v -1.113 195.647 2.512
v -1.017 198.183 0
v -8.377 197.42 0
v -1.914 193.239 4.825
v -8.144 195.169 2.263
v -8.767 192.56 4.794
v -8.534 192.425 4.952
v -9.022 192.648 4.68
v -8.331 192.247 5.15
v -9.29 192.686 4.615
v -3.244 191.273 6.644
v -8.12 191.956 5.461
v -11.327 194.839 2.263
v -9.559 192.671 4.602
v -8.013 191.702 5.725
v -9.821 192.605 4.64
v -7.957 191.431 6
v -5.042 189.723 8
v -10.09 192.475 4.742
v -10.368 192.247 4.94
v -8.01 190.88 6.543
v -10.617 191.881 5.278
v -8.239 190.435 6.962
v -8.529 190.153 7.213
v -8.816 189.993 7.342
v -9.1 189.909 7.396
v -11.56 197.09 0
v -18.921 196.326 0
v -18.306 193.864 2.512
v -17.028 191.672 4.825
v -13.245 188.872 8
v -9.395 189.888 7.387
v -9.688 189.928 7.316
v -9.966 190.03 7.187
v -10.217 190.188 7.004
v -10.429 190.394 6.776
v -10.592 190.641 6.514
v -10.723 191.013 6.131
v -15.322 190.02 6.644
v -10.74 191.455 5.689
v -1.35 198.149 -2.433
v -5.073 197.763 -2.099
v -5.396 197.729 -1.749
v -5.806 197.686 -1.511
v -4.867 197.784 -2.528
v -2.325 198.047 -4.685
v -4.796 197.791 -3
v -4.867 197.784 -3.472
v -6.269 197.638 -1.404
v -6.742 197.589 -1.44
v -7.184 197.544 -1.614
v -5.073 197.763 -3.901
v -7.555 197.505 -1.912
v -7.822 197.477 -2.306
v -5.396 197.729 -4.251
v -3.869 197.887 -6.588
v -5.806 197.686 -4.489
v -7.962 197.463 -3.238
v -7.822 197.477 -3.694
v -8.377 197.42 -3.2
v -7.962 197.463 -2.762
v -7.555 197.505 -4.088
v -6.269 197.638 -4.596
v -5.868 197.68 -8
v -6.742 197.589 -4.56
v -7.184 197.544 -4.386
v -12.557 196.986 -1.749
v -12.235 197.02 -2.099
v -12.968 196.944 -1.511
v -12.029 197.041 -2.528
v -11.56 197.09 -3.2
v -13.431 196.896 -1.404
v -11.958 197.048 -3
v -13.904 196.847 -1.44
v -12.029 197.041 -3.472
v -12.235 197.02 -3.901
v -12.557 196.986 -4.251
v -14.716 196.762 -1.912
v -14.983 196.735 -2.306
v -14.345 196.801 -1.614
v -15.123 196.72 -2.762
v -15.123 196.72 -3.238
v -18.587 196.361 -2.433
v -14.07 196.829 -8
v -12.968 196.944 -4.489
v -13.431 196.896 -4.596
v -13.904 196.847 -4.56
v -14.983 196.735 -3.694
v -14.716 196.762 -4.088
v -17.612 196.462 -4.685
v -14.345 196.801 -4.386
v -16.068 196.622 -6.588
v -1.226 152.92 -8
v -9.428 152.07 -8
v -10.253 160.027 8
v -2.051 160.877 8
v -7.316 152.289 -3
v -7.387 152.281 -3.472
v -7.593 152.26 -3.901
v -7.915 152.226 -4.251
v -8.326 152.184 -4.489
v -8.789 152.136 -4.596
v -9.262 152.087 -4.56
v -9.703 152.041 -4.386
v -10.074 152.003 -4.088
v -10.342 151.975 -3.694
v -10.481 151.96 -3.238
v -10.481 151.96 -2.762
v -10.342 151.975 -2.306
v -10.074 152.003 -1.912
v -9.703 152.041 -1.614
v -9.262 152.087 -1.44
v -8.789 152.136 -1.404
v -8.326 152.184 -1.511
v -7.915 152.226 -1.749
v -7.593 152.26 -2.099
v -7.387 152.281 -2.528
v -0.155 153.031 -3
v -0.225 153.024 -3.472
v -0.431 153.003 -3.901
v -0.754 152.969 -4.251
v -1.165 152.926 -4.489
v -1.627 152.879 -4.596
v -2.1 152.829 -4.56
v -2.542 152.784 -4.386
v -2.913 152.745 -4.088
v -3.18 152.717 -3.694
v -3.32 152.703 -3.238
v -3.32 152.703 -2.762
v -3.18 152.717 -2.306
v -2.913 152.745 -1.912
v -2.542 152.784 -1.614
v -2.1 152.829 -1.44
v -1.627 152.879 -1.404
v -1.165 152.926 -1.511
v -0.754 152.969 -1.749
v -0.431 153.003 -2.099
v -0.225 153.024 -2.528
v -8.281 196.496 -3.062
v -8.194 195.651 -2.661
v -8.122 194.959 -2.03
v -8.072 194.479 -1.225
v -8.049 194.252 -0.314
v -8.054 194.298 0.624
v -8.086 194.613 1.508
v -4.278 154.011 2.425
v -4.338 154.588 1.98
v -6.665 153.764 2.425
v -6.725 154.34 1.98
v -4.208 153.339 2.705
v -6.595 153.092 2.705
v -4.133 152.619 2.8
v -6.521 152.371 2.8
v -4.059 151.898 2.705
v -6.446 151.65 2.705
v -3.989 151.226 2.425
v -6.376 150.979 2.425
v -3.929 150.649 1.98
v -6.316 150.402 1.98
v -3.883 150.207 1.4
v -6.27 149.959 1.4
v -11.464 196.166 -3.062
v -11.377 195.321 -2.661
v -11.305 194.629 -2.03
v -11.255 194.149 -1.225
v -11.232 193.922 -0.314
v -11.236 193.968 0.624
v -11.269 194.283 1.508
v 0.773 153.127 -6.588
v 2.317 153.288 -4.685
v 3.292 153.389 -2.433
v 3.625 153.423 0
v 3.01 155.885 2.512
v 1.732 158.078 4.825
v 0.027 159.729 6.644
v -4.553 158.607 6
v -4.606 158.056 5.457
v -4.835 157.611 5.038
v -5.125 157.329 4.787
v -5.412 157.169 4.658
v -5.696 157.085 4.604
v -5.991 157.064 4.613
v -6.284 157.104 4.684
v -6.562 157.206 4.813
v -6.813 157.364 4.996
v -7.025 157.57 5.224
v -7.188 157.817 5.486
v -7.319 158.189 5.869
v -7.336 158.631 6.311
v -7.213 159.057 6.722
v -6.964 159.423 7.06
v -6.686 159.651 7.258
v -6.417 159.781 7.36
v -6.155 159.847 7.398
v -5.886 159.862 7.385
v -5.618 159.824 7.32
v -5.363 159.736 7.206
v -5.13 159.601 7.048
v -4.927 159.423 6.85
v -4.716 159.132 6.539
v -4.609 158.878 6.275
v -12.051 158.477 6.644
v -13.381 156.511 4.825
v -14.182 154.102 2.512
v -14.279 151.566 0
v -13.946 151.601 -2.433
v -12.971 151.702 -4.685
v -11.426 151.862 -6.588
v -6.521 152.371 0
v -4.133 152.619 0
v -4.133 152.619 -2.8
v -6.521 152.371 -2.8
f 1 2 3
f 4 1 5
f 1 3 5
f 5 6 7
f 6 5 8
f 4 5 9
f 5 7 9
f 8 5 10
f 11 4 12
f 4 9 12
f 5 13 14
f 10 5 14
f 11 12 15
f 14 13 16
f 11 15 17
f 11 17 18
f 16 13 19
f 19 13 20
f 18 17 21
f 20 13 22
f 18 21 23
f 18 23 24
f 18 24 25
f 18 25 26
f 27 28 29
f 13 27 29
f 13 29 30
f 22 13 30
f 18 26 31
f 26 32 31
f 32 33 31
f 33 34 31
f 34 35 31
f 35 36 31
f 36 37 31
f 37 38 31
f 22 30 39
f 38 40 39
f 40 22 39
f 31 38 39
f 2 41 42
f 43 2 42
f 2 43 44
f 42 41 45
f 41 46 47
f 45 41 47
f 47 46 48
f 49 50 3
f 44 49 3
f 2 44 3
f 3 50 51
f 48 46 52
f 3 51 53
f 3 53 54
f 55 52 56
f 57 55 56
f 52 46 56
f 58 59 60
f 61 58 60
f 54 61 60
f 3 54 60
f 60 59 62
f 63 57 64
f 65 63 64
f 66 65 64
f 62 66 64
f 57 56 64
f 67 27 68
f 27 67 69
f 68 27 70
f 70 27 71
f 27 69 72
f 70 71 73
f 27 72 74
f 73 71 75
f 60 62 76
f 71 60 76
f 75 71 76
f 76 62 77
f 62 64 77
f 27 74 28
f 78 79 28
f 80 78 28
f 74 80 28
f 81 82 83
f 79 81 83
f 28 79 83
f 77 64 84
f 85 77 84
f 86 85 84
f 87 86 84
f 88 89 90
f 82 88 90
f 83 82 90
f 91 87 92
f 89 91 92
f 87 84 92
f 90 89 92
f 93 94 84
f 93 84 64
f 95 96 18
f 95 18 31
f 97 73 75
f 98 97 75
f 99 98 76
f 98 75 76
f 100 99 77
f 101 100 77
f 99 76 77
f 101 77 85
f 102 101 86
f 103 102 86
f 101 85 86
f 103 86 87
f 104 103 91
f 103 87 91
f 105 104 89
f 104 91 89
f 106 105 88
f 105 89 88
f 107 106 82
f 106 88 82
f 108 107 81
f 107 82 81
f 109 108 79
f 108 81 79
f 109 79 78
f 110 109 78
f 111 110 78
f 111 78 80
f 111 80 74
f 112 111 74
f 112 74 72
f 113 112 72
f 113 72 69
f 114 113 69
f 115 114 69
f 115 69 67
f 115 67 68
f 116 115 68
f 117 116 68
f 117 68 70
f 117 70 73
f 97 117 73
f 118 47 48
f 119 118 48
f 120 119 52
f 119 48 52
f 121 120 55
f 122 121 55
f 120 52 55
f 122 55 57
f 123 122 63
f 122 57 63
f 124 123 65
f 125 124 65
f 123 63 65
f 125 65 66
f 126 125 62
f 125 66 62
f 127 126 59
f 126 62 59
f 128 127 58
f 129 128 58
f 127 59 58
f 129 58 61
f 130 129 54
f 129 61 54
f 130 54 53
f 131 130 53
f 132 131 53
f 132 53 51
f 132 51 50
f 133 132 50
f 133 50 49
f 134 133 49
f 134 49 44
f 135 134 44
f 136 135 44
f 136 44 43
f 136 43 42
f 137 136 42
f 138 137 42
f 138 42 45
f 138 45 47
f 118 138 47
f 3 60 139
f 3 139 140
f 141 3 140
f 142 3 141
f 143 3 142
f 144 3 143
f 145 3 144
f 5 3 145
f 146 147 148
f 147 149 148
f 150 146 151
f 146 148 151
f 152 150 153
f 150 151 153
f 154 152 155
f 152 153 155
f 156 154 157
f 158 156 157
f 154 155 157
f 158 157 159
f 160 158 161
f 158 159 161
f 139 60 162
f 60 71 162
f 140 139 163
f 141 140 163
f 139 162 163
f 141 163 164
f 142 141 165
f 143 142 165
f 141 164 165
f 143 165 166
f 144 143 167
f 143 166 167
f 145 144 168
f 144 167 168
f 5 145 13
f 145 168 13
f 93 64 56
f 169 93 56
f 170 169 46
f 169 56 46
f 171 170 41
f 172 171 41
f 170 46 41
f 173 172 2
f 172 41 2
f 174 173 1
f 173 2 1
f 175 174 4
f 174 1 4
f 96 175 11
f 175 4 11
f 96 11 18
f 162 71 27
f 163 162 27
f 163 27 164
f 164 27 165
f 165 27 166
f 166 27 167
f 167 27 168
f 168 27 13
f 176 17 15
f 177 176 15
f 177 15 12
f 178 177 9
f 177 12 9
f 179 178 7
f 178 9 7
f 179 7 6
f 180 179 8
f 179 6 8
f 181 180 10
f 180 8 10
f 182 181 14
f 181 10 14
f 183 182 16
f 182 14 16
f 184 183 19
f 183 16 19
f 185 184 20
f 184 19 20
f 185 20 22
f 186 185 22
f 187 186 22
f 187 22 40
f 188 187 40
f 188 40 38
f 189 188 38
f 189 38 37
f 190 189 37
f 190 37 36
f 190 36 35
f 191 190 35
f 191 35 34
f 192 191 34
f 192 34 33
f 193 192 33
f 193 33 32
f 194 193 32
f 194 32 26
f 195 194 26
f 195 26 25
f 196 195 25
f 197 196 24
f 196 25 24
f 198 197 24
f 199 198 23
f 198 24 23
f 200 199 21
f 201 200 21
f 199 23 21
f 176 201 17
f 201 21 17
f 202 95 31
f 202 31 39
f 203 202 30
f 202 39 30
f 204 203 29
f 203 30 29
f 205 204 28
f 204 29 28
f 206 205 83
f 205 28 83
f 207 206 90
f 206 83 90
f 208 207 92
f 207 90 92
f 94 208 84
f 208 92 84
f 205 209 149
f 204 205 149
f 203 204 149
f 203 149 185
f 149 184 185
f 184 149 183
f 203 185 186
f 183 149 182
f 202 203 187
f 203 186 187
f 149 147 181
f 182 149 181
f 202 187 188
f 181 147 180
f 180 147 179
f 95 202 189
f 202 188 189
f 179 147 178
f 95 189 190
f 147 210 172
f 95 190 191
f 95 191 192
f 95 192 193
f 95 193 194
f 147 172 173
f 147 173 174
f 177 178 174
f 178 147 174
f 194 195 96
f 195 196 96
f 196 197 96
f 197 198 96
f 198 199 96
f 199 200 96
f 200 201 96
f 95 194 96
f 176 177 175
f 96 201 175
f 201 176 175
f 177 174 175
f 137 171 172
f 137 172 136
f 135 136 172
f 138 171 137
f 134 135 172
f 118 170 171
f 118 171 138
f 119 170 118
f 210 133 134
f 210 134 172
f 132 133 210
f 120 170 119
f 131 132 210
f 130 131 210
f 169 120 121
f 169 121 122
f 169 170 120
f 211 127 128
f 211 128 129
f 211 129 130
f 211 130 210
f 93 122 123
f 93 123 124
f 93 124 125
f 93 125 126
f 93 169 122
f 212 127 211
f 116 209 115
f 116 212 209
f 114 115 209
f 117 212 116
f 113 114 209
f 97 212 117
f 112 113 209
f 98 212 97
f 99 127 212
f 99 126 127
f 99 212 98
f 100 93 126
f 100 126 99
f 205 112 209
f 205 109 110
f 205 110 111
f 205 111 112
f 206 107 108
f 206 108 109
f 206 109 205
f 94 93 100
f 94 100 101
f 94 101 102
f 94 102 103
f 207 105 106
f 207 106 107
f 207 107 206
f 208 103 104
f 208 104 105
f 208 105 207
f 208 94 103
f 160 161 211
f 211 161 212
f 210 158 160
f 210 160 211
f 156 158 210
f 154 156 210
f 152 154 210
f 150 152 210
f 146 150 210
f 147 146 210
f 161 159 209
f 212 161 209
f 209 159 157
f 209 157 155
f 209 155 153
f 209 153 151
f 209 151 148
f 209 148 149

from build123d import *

# Parameters (mm, degrees)
SKETCH3_R               = 9
BOSS_EXTRUDE1_DEPTH     = 45
CUT_EXTRUDE1_DEPTH      = 14.617013191
CUT_EXTRUDE1_DEPTH_BACK = 14.617013191
BOSS_EXTRUDE2_DEPTH     = 1.2
CUT_EXTRUDE2_DEPTH      = 1.6
SKETCH8_R               = 1.6
SKETCH8_R_2             = 1.4
CUT_EXTRUDE3_DEPTH      = 2.846805277
CUT_EXTRUDE3_DEPTH_BACK = 49.445593418
CUT_EXTRUDE4_DEPTH      = 47.846805277


with BuildPart() as part:
    # Sketch3 → Boss-Extrude1 (new body)
    with BuildSketch(Plane(origin=(-20.344467381, 196.178792599, 0), x_dir=(-0.994665758, -0.103150523, 0), z_dir=(0.103150523, -0.994665758, 0))):
        with Locations((-10.431405186, 0)):
            Circle(SKETCH3_R)
    extrude(amount=BOSS_EXTRUDE1_DEPTH)

    # Sketch4 → Cut-Extrude1 (cut, two sides)
    with BuildSketch(Plane(origin=(10.375761543, 1.076004901, 0), x_dir=(0.103150523, -0.994665758, 0), z_dir=(-0.994665758, -0.103150523, 0))) as cut_extrude1_sk:
        Polygon((-197.230869842, 0), (-188.230869842, 9), (-197.230869842, 9), align=None)
        Polygon((-161.230869842, 9), (-152.230869842, 9), (-152.230869842, 0), align=None)
    extrude(amount=CUT_EXTRUDE1_DEPTH, mode=Mode.SUBTRACT)
    extrude(cut_extrude1_sk.sketch, amount=-CUT_EXTRUDE1_DEPTH_BACK, mode=Mode.SUBTRACT)

    # Sketch5 → Boss-Extrude2 (add, symmetric)
    with BuildSketch(Plane(origin=(10.375761543, 1.076004901, 0), x_dir=(0.103150523, -0.994665758, 0), z_dir=(-0.994665758, -0.103150523, 0))):
        with BuildLine():
            Line((-152.230869842, 0), (-154.210768829, 1.979898987))
            ThreePointArc((-154.210768829, 1.979898987), (-151.865396504, 2.776045612), (-149.805998711, 1.4))
            Line((-149.805998711, 1.4), (-152.230869842, -2.8))
            Line((-152.230869842, -2.8), (-152.230869842, 0))
        make_face()
    extrude(amount=BOSS_EXTRUDE2_DEPTH, both=True)

    # Sketch7 → Cut-Extrude2 (cut, symmetric)
    with BuildSketch(Plane(origin=(10.375761543, 1.076004901, 0), x_dir=(0.103150523, -0.994665758, 0), z_dir=(-0.994665758, -0.103150523, 0))):
        with BuildLine():
            Line((-194.968128142, 2.2627417), (-197.230869842, 0))
            Line((-197.230869842, 0), (-197.230869842, -3.2))
            ThreePointArc((-197.230869842, -3.2), (-194.274455338, -1.224586984), (-194.968128142, 2.2627417))
        make_face()
    extrude(amount=CUT_EXTRUDE2_DEPTH, both=True, mode=Mode.SUBTRACT)

    # Sketch8 → Cut-Extrude3 (cut, two sides)
    with BuildSketch(Plane(origin=(-20.344467381, 196.178792599, 0), x_dir=(0.994665758, 0.103150523, 0), z_dir=(-0.103150523, 0.994665758, 0))) as cut_extrude3_sk:
        with Locations((6.831405186, 3)):
            Circle(SKETCH8_R)
        with Locations((14.031405186, 3)):
            Circle(SKETCH8_R)
        with Locations((10.431405186, -6)):
            Circle(SKETCH8_R_2)
    extrude(amount=CUT_EXTRUDE3_DEPTH, mode=Mode.SUBTRACT)
    extrude(cut_extrude3_sk.sketch, amount=-CUT_EXTRUDE3_DEPTH_BACK, mode=Mode.SUBTRACT)

    # Sketch9 → Cut-Extrude4 (cut, through all)
    with BuildSketch(Plane(origin=(-15.702693845, 151.418833501, 0), x_dir=(0.994665758, 0.103150523, 0), z_dir=(0.103150523, -0.994665758, 0))):
        with BuildLine():
            Line((6.30829956, -8), (14.554510811, -8))
            ThreePointArc((14.554510811, -8), (10.431405186, -9), (6.30829956, -8))
        make_face()
        with BuildLine():
            Line((14.554510811, 8), (6.30829956, 8))
            ThreePointArc((6.30829956, 8), (10.431405186, 9), (14.554510811, 8))
        make_face()
    extrude(amount=-CUT_EXTRUDE4_DEPTH, mode=Mode.SUBTRACT)


solid = part.part
